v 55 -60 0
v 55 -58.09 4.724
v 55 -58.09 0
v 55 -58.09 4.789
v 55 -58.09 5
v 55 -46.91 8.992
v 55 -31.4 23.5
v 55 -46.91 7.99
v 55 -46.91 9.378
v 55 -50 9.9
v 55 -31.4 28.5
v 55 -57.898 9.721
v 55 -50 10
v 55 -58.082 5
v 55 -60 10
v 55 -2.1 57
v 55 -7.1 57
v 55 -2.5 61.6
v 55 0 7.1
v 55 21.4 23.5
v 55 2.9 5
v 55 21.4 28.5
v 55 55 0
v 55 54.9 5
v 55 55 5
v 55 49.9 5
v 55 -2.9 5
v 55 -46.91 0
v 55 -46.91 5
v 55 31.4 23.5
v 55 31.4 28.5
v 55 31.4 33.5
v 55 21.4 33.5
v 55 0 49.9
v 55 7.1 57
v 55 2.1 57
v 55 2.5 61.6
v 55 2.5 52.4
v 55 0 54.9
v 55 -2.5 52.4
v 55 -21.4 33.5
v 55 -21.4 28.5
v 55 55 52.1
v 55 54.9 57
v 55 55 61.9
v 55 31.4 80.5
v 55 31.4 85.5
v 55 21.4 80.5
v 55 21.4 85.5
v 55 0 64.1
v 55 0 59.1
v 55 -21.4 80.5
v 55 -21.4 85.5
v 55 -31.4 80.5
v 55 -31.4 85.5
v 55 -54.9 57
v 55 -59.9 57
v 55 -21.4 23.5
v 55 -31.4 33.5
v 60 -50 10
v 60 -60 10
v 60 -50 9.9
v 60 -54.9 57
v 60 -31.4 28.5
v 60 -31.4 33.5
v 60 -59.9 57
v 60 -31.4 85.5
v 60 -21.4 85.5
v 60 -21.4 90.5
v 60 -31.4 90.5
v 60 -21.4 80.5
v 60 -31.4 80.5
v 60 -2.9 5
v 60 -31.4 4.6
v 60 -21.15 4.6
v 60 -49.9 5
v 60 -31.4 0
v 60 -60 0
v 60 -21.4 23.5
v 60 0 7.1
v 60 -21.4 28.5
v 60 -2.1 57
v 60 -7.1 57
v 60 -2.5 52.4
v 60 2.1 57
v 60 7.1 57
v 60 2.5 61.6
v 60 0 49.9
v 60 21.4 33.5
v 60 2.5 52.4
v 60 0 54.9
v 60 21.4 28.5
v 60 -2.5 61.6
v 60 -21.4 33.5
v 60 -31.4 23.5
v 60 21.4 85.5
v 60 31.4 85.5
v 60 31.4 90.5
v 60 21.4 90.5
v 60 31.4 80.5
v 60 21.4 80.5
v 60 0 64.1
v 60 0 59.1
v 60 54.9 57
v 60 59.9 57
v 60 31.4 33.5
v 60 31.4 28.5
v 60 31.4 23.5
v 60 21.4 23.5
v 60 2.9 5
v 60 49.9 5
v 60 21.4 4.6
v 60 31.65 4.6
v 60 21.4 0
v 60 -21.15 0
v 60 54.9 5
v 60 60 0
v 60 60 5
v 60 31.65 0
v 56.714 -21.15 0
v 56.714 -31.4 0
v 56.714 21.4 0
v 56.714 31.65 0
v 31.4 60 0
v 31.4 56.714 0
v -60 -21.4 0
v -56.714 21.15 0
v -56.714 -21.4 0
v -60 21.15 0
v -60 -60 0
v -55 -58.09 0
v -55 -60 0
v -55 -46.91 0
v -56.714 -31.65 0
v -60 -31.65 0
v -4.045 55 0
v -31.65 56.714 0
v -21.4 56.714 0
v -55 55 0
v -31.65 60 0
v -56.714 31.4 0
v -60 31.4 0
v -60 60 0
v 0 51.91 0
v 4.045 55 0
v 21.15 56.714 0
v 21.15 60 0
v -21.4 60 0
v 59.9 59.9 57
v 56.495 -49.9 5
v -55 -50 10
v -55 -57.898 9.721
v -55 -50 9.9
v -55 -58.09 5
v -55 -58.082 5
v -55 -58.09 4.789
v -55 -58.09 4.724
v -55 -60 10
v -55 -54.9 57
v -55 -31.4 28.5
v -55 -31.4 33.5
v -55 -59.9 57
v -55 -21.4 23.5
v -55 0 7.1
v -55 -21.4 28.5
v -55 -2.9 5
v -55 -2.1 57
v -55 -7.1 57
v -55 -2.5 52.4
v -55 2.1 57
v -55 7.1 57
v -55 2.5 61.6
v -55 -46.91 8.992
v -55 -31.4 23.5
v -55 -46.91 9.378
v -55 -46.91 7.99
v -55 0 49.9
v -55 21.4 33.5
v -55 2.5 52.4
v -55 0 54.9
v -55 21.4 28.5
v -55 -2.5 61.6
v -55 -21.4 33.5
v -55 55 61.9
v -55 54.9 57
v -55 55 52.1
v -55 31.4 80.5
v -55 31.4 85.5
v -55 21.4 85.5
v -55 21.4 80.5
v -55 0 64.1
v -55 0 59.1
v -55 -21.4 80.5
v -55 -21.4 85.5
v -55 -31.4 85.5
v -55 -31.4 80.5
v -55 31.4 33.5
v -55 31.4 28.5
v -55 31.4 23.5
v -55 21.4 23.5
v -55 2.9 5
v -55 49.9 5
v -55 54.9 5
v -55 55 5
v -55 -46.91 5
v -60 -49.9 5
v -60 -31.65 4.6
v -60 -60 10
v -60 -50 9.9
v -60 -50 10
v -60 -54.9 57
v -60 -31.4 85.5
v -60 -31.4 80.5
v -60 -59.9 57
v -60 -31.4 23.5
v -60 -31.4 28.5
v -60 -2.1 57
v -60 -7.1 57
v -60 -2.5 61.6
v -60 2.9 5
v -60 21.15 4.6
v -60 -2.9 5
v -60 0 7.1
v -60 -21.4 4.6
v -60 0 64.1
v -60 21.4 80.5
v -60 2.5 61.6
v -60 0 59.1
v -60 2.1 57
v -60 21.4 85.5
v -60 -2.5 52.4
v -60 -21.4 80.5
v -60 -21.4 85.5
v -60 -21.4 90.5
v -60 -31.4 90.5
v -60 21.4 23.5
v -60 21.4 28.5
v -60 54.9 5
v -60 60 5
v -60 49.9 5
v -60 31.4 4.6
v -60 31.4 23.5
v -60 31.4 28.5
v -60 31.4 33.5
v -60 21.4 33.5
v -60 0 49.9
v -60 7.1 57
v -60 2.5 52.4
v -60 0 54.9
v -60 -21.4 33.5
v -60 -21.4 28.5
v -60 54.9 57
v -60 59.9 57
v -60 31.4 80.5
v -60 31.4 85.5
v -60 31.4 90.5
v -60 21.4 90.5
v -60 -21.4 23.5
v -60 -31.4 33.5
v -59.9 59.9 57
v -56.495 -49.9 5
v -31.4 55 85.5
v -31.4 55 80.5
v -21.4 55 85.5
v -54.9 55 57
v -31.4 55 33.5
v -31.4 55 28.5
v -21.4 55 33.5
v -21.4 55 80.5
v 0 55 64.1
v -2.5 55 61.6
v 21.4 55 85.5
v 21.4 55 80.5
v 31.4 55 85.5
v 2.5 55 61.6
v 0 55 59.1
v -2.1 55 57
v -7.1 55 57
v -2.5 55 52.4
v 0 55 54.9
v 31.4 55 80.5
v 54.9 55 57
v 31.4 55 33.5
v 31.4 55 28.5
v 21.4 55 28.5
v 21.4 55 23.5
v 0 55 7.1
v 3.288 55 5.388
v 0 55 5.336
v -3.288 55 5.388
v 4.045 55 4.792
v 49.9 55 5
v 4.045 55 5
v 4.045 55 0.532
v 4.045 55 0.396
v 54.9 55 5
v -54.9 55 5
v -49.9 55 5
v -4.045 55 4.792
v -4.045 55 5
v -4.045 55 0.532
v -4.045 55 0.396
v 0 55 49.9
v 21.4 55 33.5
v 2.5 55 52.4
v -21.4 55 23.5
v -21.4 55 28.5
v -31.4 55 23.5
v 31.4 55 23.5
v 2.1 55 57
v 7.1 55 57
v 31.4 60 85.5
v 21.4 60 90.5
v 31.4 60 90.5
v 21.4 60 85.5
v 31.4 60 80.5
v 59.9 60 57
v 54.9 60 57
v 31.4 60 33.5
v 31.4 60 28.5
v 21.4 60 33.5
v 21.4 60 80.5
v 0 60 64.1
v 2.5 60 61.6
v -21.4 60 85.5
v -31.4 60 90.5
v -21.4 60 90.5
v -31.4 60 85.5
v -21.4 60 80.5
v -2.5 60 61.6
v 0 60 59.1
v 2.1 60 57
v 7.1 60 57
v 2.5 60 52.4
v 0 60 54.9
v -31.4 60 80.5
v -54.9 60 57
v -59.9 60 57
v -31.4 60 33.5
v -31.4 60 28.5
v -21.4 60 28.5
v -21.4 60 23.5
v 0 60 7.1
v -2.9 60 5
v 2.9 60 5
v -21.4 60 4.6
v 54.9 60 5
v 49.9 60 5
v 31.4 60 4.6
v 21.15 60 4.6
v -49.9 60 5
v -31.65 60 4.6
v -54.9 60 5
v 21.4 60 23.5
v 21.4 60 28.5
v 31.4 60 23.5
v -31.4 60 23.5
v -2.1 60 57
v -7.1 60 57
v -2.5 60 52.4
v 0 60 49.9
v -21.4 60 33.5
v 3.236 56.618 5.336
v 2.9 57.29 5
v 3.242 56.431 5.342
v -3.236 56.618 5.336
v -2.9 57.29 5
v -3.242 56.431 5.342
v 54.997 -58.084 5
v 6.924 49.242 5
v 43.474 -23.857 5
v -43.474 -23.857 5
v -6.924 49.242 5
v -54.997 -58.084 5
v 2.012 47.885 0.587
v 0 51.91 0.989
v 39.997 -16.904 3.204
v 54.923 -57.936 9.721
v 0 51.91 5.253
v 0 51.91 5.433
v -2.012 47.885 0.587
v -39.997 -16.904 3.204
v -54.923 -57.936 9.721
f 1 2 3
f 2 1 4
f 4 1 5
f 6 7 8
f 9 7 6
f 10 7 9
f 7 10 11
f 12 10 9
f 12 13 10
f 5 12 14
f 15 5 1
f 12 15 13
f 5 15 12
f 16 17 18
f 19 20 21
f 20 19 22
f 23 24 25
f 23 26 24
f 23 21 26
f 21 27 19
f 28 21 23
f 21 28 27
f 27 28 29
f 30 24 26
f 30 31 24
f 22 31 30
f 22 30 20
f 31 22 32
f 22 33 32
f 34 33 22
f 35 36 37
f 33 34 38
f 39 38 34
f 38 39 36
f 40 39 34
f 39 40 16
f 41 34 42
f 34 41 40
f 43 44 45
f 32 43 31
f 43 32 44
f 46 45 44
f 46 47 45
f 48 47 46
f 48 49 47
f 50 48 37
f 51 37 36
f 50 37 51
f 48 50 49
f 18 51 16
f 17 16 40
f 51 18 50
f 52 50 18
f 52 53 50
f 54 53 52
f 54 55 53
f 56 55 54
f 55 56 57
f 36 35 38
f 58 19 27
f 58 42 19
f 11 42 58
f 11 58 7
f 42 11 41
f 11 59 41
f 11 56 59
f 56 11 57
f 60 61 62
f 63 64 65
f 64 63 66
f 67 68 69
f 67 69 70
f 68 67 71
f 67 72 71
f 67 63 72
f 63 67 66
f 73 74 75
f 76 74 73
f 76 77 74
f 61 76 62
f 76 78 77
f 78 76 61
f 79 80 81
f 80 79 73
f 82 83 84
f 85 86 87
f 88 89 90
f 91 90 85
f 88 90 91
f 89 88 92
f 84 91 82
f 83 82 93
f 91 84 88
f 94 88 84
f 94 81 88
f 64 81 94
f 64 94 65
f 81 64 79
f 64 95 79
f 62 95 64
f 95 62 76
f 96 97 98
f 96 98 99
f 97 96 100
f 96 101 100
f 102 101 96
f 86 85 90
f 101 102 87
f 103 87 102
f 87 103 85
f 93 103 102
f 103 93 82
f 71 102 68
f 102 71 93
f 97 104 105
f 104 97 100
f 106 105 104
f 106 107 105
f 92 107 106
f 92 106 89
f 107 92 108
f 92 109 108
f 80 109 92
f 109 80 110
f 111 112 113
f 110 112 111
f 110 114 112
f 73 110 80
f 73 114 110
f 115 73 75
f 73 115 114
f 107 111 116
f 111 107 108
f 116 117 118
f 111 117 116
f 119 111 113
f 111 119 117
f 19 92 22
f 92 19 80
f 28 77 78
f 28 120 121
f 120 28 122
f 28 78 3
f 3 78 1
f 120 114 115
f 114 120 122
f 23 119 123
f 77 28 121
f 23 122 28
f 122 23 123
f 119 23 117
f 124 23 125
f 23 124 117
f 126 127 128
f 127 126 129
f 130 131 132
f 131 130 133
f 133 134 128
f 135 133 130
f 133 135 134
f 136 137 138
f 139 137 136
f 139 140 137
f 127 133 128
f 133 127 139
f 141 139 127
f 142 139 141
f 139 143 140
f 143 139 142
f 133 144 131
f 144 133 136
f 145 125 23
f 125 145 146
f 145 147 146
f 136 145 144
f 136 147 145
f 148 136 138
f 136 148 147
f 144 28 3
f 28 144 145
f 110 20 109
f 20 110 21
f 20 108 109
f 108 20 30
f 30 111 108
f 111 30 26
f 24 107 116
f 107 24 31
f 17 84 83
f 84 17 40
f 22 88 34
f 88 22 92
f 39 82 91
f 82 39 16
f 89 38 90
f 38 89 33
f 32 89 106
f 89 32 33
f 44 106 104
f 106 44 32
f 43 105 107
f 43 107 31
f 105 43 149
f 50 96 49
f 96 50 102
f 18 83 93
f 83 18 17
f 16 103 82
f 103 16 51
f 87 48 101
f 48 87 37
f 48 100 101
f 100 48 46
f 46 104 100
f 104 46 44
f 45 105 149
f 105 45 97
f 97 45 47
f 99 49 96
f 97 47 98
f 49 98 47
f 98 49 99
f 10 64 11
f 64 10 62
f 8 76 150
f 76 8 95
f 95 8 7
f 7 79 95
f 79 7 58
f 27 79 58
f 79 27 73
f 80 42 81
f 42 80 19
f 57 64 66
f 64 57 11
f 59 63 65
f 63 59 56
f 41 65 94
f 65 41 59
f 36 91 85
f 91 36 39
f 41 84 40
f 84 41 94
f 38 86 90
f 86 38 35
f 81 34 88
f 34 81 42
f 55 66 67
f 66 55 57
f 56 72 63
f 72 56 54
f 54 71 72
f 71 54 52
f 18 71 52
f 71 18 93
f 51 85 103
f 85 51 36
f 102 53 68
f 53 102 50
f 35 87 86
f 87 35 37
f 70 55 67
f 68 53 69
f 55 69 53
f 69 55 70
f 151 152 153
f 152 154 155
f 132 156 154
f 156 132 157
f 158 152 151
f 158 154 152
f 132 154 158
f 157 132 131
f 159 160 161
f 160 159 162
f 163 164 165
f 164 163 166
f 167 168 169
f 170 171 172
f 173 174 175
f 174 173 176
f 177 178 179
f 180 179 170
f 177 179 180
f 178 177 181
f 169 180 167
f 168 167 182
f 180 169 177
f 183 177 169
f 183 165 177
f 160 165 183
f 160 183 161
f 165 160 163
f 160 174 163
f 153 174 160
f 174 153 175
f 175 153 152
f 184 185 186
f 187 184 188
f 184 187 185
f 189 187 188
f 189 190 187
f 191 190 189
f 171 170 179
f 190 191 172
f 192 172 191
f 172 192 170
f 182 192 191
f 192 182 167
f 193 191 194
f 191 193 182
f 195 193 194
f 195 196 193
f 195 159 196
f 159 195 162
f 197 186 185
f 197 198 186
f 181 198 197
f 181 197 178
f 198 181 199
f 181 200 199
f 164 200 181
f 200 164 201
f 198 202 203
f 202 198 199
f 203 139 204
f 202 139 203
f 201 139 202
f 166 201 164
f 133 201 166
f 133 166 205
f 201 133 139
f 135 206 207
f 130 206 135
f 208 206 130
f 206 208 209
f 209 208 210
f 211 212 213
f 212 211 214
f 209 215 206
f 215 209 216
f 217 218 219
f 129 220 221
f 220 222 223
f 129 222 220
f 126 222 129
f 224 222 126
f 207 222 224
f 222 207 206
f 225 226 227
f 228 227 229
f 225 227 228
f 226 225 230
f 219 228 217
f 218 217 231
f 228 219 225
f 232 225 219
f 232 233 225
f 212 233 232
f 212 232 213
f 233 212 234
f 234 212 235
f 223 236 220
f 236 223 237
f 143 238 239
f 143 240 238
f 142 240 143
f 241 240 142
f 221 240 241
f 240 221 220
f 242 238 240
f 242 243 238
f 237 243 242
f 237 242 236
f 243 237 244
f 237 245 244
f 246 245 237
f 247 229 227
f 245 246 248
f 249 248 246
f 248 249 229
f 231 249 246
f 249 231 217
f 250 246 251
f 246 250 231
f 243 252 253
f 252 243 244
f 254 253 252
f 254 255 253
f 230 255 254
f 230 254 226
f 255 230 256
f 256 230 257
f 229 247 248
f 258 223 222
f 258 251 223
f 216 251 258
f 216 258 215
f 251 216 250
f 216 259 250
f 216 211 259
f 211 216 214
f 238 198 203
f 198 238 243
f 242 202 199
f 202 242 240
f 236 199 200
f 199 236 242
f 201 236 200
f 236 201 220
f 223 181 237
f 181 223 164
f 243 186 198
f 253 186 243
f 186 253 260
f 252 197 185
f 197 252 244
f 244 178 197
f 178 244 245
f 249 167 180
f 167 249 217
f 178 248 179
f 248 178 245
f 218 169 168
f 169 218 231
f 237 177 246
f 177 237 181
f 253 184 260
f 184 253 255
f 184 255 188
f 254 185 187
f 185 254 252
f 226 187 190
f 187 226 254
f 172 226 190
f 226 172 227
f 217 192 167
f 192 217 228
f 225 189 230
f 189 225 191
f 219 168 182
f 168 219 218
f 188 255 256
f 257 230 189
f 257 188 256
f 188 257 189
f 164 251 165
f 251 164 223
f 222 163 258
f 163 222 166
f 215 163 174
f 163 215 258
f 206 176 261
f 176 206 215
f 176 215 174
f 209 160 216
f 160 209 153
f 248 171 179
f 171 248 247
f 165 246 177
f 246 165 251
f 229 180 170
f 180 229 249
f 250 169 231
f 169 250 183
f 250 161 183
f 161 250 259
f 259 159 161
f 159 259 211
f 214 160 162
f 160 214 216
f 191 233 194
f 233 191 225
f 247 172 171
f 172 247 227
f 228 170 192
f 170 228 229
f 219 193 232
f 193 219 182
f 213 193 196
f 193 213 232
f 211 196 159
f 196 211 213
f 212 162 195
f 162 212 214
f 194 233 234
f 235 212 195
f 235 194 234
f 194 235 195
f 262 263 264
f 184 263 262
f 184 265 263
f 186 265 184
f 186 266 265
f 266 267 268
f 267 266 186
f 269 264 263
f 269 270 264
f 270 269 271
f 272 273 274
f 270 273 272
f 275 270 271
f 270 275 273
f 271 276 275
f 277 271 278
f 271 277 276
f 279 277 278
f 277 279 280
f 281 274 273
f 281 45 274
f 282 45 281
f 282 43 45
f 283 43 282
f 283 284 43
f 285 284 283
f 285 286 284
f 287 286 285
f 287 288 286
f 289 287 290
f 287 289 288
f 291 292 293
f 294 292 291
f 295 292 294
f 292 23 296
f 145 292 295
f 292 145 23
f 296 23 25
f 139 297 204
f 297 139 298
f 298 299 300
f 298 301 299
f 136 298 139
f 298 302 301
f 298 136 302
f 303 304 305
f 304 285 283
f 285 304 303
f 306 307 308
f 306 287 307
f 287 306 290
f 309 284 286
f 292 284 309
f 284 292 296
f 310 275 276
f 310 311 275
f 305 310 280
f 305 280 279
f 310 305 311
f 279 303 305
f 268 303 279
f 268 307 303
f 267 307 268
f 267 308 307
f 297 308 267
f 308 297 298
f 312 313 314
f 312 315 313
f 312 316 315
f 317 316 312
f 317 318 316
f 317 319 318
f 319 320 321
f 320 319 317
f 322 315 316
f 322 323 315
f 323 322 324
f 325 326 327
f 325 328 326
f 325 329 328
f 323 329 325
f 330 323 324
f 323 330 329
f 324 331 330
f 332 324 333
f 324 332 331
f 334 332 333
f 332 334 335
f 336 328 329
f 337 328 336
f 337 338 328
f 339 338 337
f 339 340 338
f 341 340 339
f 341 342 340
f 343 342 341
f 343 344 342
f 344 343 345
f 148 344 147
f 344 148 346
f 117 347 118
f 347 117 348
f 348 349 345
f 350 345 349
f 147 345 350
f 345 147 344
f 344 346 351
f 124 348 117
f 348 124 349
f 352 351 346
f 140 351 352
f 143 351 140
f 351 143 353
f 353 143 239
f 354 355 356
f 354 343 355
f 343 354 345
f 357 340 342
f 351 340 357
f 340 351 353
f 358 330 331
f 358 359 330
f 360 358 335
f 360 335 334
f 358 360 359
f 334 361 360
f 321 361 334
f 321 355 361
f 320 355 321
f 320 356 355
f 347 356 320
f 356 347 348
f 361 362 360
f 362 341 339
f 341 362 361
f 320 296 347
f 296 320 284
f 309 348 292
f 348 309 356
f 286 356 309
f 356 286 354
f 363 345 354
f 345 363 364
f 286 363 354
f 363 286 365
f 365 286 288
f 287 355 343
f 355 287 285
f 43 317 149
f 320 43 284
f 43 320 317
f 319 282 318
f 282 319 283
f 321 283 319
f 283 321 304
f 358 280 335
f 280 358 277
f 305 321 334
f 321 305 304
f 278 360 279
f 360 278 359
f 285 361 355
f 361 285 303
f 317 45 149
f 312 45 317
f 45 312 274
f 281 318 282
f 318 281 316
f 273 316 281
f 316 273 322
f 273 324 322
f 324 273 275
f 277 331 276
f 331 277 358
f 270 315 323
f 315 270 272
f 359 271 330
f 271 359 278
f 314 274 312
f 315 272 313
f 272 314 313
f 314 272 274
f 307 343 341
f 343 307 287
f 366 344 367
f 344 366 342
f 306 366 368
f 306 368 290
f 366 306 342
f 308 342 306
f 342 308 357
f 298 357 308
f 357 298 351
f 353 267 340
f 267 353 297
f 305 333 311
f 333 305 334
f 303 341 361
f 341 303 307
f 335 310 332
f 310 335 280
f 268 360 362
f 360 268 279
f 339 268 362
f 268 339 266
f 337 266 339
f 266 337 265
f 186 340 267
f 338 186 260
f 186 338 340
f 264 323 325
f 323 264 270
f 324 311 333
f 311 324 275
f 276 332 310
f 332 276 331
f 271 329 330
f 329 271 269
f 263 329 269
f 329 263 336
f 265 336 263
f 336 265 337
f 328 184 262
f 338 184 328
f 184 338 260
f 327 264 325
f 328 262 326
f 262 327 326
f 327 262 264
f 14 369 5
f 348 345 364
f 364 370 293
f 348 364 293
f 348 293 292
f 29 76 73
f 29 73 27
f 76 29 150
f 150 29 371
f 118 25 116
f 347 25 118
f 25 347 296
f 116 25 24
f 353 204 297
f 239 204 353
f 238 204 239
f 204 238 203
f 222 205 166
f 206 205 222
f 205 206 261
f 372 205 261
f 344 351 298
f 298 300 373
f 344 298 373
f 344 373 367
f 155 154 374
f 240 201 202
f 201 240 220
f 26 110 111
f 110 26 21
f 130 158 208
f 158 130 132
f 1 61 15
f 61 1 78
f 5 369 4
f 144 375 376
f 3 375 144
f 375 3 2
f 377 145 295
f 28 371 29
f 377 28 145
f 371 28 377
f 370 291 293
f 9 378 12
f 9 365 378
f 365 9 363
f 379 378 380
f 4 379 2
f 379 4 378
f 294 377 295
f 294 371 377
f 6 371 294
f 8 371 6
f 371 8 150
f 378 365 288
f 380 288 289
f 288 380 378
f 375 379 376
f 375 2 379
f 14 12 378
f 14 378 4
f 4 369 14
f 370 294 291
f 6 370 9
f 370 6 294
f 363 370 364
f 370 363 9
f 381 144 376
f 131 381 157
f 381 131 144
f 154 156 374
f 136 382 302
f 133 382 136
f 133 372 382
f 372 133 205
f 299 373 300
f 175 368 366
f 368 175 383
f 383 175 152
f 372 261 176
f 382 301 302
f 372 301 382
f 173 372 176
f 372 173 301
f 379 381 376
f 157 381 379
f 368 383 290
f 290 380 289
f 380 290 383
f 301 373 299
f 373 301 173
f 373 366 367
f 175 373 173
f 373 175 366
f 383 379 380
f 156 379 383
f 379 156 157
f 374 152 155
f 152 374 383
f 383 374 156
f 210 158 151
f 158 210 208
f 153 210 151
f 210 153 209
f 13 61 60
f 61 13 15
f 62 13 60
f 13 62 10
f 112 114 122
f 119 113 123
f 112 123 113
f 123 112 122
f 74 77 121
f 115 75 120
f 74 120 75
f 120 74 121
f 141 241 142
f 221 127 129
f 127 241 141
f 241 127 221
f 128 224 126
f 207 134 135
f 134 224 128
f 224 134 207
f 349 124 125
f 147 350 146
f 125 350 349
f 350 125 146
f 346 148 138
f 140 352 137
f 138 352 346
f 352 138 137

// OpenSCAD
$fn=64;
difference(){union(){translate(v = [-57.500, 0])
translate(v = [-2.500, -60.000])
cube(size = [5, 120, 5]);
translate(v = [57.500, 0])
translate(v = [-2.500, -60.000])
cube(size = [5, 120, 5]);
translate(v = [0, 57.500])
rotate(a = [0, 0, 90])
translate(v = [-2.500, -60.000])
cube(size = [5, 120, 5]);
translate(v = [28.750, 0])
rotate(a = [0, 0, 26.565])
translate(v = [-2.500, -63.738])
cube(size = [5, 127.475, 5]);
translate(v = [28.750, 0, 2.500])
rotate(a = [-2, 0, 26.565])
translate(v = [-2.500, -63.738])
cube(size = [5, 127.475, 5]);
translate(v = [-28.750, 0])
rotate(a = [0, 0, -26.565])
translate(v = [-2.500, -63.738])
cube(size = [5, 127.475, 5]);
translate(v = [-28.750, 0, 2.500])
rotate(a = [-2, 0, -26.565])
translate(v = [-2.500, -63.738])
cube(size = [5, 127.475, 5]);
translate(v = [-57.500, -55.000, 5])
translate(v = [-2.500, -5.000])
cube(size = [5, 10, 5]);
translate(v = [57.500, -55.000, 5])
translate(v = [-2.500, -5.000])
cube(size = [5, 10, 5]);
translate(v = [57.500, 26.400])
rotate(a = [0, 0, 180])
union(){union(){union(){translate(v = [2.500, -33.500])
union(){rotate(a = [0, -90, 0])
linear_extrude(height = 5){polygon(points = [[0, 0], [28.500, 28.500], [28.500, 38.500], [0, 67.000], [0, 62.000], [23.500, 38.500], [23.500, 28.500], [0, 5], [0, 0]]);
}
translate(v = [-5, 38.500, 28.500])
rotate(a = [90, 0, 0])
linear_extrude(height = 10){polygon(points = [[0, 0], [5.000, 0.000], [0, 5], [0, 0]]);
}
}
}
translate(v = [0, 0, 28.500])
translate(v = [2.500, -33.500])
translate(v = [-5, 0, 28.500])
rotate(a = [0, 180, 0])
union(){rotate(a = [0, -90, 0])
linear_extrude(height = 5){polygon(points = [[0, 0], [28.500, 28.500], [28.500, 38.500], [0, 67.000], [0, 62.000], [23.500, 38.500], [23.500, 28.500], [0, 5], [0, 0]]);
}
translate(v = [-5, 38.500, 28.500])
rotate(a = [90, 0, 0])
linear_extrude(height = 10){polygon(points = [[0, 0], [5.000, 0.000], [0, 5], [0, 0]]);
}
}
}
translate(v = [0, 0, 57.000])
translate(v = [2.500, -33.500])
union(){rotate(a = [0, -90, 0])
linear_extrude(height = 5){polygon(points = [[0, 0], [28.500, 28.500], [28.500, 38.500], [0, 67.000], [0, 62.000], [23.500, 38.500], [23.500, 28.500], [0, 5], [0, 0]]);
}
translate(v = [-5, 38.500, 28.500])
rotate(a = [90, 0, 0])
linear_extrude(height = 10){polygon(points = [[0, 0], [5.000, 0.000], [0, 5], [0, 0]]);
}
}
}
translate(v = [57.500, -26.400])
rotate(a = [0, 0, 180])
union(){union(){union(){translate(v = [2.500, -33.500])
union(){rotate(a = [0, -90, 0])
linear_extrude(height = 5){polygon(points = [[0, 0], [28.500, 28.500], [28.500, 38.500], [0, 67.000], [0, 62.000], [23.500, 38.500], [23.500, 28.500], [0, 5], [0, 0]]);
}
translate(v = [-5, 38.500, 28.500])
rotate(a = [90, 0, 0])
linear_extrude(height = 10){polygon(points = [[0, 0], [5.000, 0.000], [0, 5], [0, 0]]);
}
}
}
translate(v = [0, 0, 28.500])
translate(v = [2.500, -33.500])
translate(v = [-5, 0, 28.500])
rotate(a = [0, 180, 0])
union(){rotate(a = [0, -90, 0])
linear_extrude(height = 5){polygon(points = [[0, 0], [28.500, 28.500], [28.500, 38.500], [0, 67.000], [0, 62.000], [23.500, 38.500], [23.500, 28.500], [0, 5], [0, 0]]);
}
translate(v = [-5, 38.500, 28.500])
rotate(a = [90, 0, 0])
linear_extrude(height = 10){polygon(points = [[0, 0], [5.000, 0.000], [0, 5], [0, 0]]);
}
}
}
translate(v = [0, 0, 57.000])
translate(v = [2.500, -33.500])
union(){rotate(a = [0, -90, 0])
linear_extrude(height = 5){polygon(points = [[0, 0], [28.500, 28.500], [28.500, 38.500], [0, 67.000], [0, 62.000], [23.500, 38.500], [23.500, 28.500], [0, 5], [0, 0]]);
}
translate(v = [-5, 38.500, 28.500])
rotate(a = [90, 0, 0])
linear_extrude(height = 10){polygon(points = [[0, 0], [5.000, 0.000], [0, 5], [0, 0]]);
}
}
}
translate(v = [-57.500, 26.400])
union(){union(){union(){translate(v = [2.500, -33.500])
union(){rotate(a = [0, -90, 0])
linear_extrude(height = 5){polygon(points = [[0, 0], [28.500, 28.500], [28.500, 38.500], [0, 67.000], [0, 62.000], [23.500, 38.500], [23.500, 28.500], [0, 5], [0, 0]]);
}
translate(v = [-5, 38.500, 28.500])
rotate(a = [90, 0, 0])
linear_extrude(height = 10){polygon(points = [[0, 0], [5.000, 0.000], [0, 5], [0, 0]]);
}
}
}
translate(v = [0, 0, 28.500])
translate(v = [2.500, -33.500])
translate(v = [-5, 0, 28.500])
rotate(a = [0, 180, 0])
union(){rotate(a = [0, -90, 0])
linear_extrude(height = 5){polygon(points = [[0, 0], [28.500, 28.500], [28.500, 38.500], [0, 67.000], [0, 62.000], [23.500, 38.500], [23.500, 28.500], [0, 5], [0, 0]]);
}
translate(v = [-5, 38.500, 28.500])
rotate(a = [90, 0, 0])
linear_extrude(height = 10){polygon(points = [[0, 0], [5.000, 0.000], [0, 5], [0, 0]]);
}
}
}
translate(v = [0, 0, 57.000])
translate(v = [2.500, -33.500])
union(){rotate(a = [0, -90, 0])
linear_extrude(height = 5){polygon(points = [[0, 0], [28.500, 28.500], [28.500, 38.500], [0, 67.000], [0, 62.000], [23.500, 38.500], [23.500, 28.500], [0, 5], [0, 0]]);
}
translate(v = [-5, 38.500, 28.500])
rotate(a = [90, 0, 0])
linear_extrude(height = 10){polygon(points = [[0, 0], [5.000, 0.000], [0, 5], [0, 0]]);
}
}
}
translate(v = [-57.500, -26.400])
union(){union(){union(){translate(v = [2.500, -33.500])
union(){rotate(a = [0, -90, 0])
linear_extrude(height = 5){polygon(points = [[0, 0], [28.500, 28.500], [28.500, 38.500], [0, 67.000], [0, 62.000], [23.500, 38.500], [23.500, 28.500], [0, 5], [0, 0]]);
}
translate(v = [-5, 38.500, 28.500])
rotate(a = [90, 0, 0])
linear_extrude(height = 10){polygon(points = [[0, 0], [5.000, 0.000], [0, 5], [0, 0]]);
}
}
}
translate(v = [0, 0, 28.500])
translate(v = [2.500, -33.500])
translate(v = [-5, 0, 28.500])
rotate(a = [0, 180, 0])
union(){rotate(a = [0, -90, 0])
linear_extrude(height = 5){polygon(points = [[0, 0], [28.500, 28.500], [28.500, 38.500], [0, 67.000], [0, 62.000], [23.500, 38.500], [23.500, 28.500], [0, 5], [0, 0]]);
}
translate(v = [-5, 38.500, 28.500])
rotate(a = [90, 0, 0])
linear_extrude(height = 10){polygon(points = [[0, 0], [5.000, 0.000], [0, 5], [0, 0]]);
}
}
}
translate(v = [0, 0, 57.000])
translate(v = [2.500, -33.500])
union(){rotate(a = [0, -90, 0])
linear_extrude(height = 5){polygon(points = [[0, 0], [28.500, 28.500], [28.500, 38.500], [0, 67.000], [0, 62.000], [23.500, 38.500], [23.500, 28.500], [0, 5], [0, 0]]);
}
translate(v = [-5, 38.500, 28.500])
rotate(a = [90, 0, 0])
linear_extrude(height = 10){polygon(points = [[0, 0], [5.000, 0.000], [0, 5], [0, 0]]);
}
}
}
translate(v = [26.400, 57.500])
rotate(a = [0, 0, -90])
union(){union(){union(){translate(v = [2.500, -33.500])
union(){rotate(a = [0, -90, 0])
linear_extrude(height = 5){polygon(points = [[0, 0], [28.500, 28.500], [28.500, 38.500], [0, 67.000], [0, 62.000], [23.500, 38.500], [23.500, 28.500], [0, 5], [0, 0]]);
}
translate(v = [-5, 38.500, 28.500])
rotate(a = [90, 0, 0])
linear_extrude(height = 10){polygon(points = [[0, 0], [5.000, 0.000], [0, 5], [0, 0]]);
}
}
}
translate(v = [0, 0, 28.500])
translate(v = [2.500, -33.500])
translate(v = [-5, 0, 28.500])
rotate(a = [0, 180, 0])
union(){rotate(a = [0, -90, 0])
linear_extrude(height = 5){polygon(points = [[0, 0], [28.500, 28.500], [28.500, 38.500], [0, 67.000], [0, 62.000], [23.500, 38.500], [23.500, 28.500], [0, 5], [0, 0]]);
}
translate(v = [-5, 38.500, 28.500])
rotate(a = [90, 0, 0])
linear_extrude(height = 10){polygon(points = [[0, 0], [5.000, 0.000], [0, 5], [0, 0]]);
}
}
}
translate(v = [0, 0, 57.000])
translate(v = [2.500, -33.500])
union(){rotate(a = [0, -90, 0])
linear_extrude(height = 5){polygon(points = [[0, 0], [28.500, 28.500], [28.500, 38.500], [0, 67.000], [0, 62.000], [23.500, 38.500], [23.500, 28.500], [0, 5], [0, 0]]);
}
translate(v = [-5, 38.500, 28.500])
rotate(a = [90, 0, 0])
linear_extrude(height = 10){polygon(points = [[0, 0], [5.000, 0.000], [0, 5], [0, 0]]);
}
}
}
translate(v = [-26.400, 57.500])
rotate(a = [0, 0, -90])
union(){union(){union(){translate(v = [2.500, -33.500])
union(){rotate(a = [0, -90, 0])
linear_extrude(height = 5){polygon(points = [[0, 0], [28.500, 28.500], [28.500, 38.500], [0, 67.000], [0, 62.000], [23.500, 38.500], [23.500, 28.500], [0, 5], [0, 0]]);
}
translate(v = [-5, 38.500, 28.500])
rotate(a = [90, 0, 0])
linear_extrude(height = 10){polygon(points = [[0, 0], [5.000, 0.000], [0, 5], [0, 0]]);
}
}
}
translate(v = [0, 0, 28.500])
translate(v = [2.500, -33.500])
translate(v = [-5, 0, 28.500])
rotate(a = [0, 180, 0])
union(){rotate(a = [0, -90, 0])
linear_extrude(height = 5){polygon(points = [[0, 0], [28.500, 28.500], [28.500, 38.500], [0, 67.000], [0, 62.000], [23.500, 38.500], [23.500, 28.500], [0, 5], [0, 0]]);
}
translate(v = [-5, 38.500, 28.500])
rotate(a = [90, 0, 0])
linear_extrude(height = 10){polygon(points = [[0, 0], [5.000, 0.000], [0, 5], [0, 0]]);
}
}
}
translate(v = [0, 0, 57.000])
translate(v = [2.500, -33.500])
union(){rotate(a = [0, -90, 0])
linear_extrude(height = 5){polygon(points = [[0, 0], [28.500, 28.500], [28.500, 38.500], [0, 67.000], [0, 62.000], [23.500, 38.500], [23.500, 28.500], [0, 5], [0, 0]]);
}
translate(v = [-5, 38.500, 28.500])
rotate(a = [90, 0, 0])
linear_extrude(height = 10){polygon(points = [[0, 0], [5.000, 0.000], [0, 5], [0, 0]]);
}
}
}
}
translate(v = [57.500, 26.400, -88.500])
rotate(a = [0, 0, 180])
union(){translate(v = [3.500, -92.625])
union(){rotate(a = [0, -90, 0])
linear_extrude(height = 7){polygon(points = [[0, 0], [87.500, 87.500], [87.500, 97.750], [0, 185.000], [0, 180.000], [82.500, 97.750], [82.500, 87.500], [0, 5], [0, 0]]);
}
translate(v = [-7, 97.625, 87.500])
rotate(a = [90, 0, 0])
linear_extrude(height = 10.250){polygon(points = [[0, 0], [5.000, 0.000], [0, 7], [0, 0]]);
}
}
}
translate(v = [57.500, -26.400, -88.500])
rotate(a = [0, 0, 180])
union(){translate(v = [3.500, -92.625])
union(){rotate(a = [0, -90, 0])
linear_extrude(height = 7){polygon(points = [[0, 0], [87.500, 87.500], [87.500, 97.750], [0, 185.000], [0, 180.000], [82.500, 97.750], [82.500, 87.500], [0, 5], [0, 0]]);
}
translate(v = [-7, 97.625, 87.500])
rotate(a = [90, 0, 0])
linear_extrude(height = 10.250){polygon(points = [[0, 0], [5.000, 0.000], [0, 7], [0, 0]]);
}
}
}
translate(v = [-57.500, 26.400, -88.500])
union(){translate(v = [3.500, -92.625])
union(){rotate(a = [0, -90, 0])
linear_extrude(height = 7){polygon(points = [[0, 0], [87.500, 87.500], [87.500, 97.750], [0, 185.000], [0, 180.000], [82.500, 97.750], [82.500, 87.500], [0, 5], [0, 0]]);
}
translate(v = [-7, 97.625, 87.500])
rotate(a = [90, 0, 0])
linear_extrude(height = 10.250){polygon(points = [[0, 0], [5.000, 0.000], [0, 7], [0, 0]]);
}
}
}
translate(v = [-57.500, -26.400, -88.500])
union(){translate(v = [3.500, -92.625])
union(){rotate(a = [0, -90, 0])
linear_extrude(height = 7){polygon(points = [[0, 0], [87.500, 87.500], [87.500, 97.750], [0, 185.000], [0, 180.000], [82.500, 97.750], [82.500, 87.500], [0, 5], [0, 0]]);
}
translate(v = [-7, 97.625, 87.500])
rotate(a = [90, 0, 0])
linear_extrude(height = 10.250){polygon(points = [[0, 0], [5.000, 0.000], [0, 7], [0, 0]]);
}
}
}
translate(v = [26.400, 57.500, -88.500])
rotate(a = [0, 0, -90])
union(){translate(v = [3.500, -92.625])
union(){rotate(a = [0, -90, 0])
linear_extrude(height = 7){polygon(points = [[0, 0], [87.500, 87.500], [87.500, 97.750], [0, 185.000], [0, 180.000], [82.500, 97.750], [82.500, 87.500], [0, 5], [0, 0]]);
}
translate(v = [-7, 97.625, 87.500])
rotate(a = [90, 0, 0])
linear_extrude(height = 10.250){polygon(points = [[0, 0], [5.000, 0.000], [0, 7], [0, 0]]);
}
}
}
translate(v = [-26.400, 57.500, -88.500])
rotate(a = [0, 0, -90])
union(){translate(v = [3.500, -92.625])
union(){rotate(a = [0, -90, 0])
linear_extrude(height = 7){polygon(points = [[0, 0], [87.500, 87.500], [87.500, 97.750], [0, 185.000], [0, 180.000], [82.500, 97.750], [82.500, 87.500], [0, 5], [0, 0]]);
}
translate(v = [-7, 97.625, 87.500])
rotate(a = [90, 0, 0])
linear_extrude(height = 10.250){polygon(points = [[0, 0], [5.000, 0.000], [0, 7], [0, 0]]);
}
}
}
}
